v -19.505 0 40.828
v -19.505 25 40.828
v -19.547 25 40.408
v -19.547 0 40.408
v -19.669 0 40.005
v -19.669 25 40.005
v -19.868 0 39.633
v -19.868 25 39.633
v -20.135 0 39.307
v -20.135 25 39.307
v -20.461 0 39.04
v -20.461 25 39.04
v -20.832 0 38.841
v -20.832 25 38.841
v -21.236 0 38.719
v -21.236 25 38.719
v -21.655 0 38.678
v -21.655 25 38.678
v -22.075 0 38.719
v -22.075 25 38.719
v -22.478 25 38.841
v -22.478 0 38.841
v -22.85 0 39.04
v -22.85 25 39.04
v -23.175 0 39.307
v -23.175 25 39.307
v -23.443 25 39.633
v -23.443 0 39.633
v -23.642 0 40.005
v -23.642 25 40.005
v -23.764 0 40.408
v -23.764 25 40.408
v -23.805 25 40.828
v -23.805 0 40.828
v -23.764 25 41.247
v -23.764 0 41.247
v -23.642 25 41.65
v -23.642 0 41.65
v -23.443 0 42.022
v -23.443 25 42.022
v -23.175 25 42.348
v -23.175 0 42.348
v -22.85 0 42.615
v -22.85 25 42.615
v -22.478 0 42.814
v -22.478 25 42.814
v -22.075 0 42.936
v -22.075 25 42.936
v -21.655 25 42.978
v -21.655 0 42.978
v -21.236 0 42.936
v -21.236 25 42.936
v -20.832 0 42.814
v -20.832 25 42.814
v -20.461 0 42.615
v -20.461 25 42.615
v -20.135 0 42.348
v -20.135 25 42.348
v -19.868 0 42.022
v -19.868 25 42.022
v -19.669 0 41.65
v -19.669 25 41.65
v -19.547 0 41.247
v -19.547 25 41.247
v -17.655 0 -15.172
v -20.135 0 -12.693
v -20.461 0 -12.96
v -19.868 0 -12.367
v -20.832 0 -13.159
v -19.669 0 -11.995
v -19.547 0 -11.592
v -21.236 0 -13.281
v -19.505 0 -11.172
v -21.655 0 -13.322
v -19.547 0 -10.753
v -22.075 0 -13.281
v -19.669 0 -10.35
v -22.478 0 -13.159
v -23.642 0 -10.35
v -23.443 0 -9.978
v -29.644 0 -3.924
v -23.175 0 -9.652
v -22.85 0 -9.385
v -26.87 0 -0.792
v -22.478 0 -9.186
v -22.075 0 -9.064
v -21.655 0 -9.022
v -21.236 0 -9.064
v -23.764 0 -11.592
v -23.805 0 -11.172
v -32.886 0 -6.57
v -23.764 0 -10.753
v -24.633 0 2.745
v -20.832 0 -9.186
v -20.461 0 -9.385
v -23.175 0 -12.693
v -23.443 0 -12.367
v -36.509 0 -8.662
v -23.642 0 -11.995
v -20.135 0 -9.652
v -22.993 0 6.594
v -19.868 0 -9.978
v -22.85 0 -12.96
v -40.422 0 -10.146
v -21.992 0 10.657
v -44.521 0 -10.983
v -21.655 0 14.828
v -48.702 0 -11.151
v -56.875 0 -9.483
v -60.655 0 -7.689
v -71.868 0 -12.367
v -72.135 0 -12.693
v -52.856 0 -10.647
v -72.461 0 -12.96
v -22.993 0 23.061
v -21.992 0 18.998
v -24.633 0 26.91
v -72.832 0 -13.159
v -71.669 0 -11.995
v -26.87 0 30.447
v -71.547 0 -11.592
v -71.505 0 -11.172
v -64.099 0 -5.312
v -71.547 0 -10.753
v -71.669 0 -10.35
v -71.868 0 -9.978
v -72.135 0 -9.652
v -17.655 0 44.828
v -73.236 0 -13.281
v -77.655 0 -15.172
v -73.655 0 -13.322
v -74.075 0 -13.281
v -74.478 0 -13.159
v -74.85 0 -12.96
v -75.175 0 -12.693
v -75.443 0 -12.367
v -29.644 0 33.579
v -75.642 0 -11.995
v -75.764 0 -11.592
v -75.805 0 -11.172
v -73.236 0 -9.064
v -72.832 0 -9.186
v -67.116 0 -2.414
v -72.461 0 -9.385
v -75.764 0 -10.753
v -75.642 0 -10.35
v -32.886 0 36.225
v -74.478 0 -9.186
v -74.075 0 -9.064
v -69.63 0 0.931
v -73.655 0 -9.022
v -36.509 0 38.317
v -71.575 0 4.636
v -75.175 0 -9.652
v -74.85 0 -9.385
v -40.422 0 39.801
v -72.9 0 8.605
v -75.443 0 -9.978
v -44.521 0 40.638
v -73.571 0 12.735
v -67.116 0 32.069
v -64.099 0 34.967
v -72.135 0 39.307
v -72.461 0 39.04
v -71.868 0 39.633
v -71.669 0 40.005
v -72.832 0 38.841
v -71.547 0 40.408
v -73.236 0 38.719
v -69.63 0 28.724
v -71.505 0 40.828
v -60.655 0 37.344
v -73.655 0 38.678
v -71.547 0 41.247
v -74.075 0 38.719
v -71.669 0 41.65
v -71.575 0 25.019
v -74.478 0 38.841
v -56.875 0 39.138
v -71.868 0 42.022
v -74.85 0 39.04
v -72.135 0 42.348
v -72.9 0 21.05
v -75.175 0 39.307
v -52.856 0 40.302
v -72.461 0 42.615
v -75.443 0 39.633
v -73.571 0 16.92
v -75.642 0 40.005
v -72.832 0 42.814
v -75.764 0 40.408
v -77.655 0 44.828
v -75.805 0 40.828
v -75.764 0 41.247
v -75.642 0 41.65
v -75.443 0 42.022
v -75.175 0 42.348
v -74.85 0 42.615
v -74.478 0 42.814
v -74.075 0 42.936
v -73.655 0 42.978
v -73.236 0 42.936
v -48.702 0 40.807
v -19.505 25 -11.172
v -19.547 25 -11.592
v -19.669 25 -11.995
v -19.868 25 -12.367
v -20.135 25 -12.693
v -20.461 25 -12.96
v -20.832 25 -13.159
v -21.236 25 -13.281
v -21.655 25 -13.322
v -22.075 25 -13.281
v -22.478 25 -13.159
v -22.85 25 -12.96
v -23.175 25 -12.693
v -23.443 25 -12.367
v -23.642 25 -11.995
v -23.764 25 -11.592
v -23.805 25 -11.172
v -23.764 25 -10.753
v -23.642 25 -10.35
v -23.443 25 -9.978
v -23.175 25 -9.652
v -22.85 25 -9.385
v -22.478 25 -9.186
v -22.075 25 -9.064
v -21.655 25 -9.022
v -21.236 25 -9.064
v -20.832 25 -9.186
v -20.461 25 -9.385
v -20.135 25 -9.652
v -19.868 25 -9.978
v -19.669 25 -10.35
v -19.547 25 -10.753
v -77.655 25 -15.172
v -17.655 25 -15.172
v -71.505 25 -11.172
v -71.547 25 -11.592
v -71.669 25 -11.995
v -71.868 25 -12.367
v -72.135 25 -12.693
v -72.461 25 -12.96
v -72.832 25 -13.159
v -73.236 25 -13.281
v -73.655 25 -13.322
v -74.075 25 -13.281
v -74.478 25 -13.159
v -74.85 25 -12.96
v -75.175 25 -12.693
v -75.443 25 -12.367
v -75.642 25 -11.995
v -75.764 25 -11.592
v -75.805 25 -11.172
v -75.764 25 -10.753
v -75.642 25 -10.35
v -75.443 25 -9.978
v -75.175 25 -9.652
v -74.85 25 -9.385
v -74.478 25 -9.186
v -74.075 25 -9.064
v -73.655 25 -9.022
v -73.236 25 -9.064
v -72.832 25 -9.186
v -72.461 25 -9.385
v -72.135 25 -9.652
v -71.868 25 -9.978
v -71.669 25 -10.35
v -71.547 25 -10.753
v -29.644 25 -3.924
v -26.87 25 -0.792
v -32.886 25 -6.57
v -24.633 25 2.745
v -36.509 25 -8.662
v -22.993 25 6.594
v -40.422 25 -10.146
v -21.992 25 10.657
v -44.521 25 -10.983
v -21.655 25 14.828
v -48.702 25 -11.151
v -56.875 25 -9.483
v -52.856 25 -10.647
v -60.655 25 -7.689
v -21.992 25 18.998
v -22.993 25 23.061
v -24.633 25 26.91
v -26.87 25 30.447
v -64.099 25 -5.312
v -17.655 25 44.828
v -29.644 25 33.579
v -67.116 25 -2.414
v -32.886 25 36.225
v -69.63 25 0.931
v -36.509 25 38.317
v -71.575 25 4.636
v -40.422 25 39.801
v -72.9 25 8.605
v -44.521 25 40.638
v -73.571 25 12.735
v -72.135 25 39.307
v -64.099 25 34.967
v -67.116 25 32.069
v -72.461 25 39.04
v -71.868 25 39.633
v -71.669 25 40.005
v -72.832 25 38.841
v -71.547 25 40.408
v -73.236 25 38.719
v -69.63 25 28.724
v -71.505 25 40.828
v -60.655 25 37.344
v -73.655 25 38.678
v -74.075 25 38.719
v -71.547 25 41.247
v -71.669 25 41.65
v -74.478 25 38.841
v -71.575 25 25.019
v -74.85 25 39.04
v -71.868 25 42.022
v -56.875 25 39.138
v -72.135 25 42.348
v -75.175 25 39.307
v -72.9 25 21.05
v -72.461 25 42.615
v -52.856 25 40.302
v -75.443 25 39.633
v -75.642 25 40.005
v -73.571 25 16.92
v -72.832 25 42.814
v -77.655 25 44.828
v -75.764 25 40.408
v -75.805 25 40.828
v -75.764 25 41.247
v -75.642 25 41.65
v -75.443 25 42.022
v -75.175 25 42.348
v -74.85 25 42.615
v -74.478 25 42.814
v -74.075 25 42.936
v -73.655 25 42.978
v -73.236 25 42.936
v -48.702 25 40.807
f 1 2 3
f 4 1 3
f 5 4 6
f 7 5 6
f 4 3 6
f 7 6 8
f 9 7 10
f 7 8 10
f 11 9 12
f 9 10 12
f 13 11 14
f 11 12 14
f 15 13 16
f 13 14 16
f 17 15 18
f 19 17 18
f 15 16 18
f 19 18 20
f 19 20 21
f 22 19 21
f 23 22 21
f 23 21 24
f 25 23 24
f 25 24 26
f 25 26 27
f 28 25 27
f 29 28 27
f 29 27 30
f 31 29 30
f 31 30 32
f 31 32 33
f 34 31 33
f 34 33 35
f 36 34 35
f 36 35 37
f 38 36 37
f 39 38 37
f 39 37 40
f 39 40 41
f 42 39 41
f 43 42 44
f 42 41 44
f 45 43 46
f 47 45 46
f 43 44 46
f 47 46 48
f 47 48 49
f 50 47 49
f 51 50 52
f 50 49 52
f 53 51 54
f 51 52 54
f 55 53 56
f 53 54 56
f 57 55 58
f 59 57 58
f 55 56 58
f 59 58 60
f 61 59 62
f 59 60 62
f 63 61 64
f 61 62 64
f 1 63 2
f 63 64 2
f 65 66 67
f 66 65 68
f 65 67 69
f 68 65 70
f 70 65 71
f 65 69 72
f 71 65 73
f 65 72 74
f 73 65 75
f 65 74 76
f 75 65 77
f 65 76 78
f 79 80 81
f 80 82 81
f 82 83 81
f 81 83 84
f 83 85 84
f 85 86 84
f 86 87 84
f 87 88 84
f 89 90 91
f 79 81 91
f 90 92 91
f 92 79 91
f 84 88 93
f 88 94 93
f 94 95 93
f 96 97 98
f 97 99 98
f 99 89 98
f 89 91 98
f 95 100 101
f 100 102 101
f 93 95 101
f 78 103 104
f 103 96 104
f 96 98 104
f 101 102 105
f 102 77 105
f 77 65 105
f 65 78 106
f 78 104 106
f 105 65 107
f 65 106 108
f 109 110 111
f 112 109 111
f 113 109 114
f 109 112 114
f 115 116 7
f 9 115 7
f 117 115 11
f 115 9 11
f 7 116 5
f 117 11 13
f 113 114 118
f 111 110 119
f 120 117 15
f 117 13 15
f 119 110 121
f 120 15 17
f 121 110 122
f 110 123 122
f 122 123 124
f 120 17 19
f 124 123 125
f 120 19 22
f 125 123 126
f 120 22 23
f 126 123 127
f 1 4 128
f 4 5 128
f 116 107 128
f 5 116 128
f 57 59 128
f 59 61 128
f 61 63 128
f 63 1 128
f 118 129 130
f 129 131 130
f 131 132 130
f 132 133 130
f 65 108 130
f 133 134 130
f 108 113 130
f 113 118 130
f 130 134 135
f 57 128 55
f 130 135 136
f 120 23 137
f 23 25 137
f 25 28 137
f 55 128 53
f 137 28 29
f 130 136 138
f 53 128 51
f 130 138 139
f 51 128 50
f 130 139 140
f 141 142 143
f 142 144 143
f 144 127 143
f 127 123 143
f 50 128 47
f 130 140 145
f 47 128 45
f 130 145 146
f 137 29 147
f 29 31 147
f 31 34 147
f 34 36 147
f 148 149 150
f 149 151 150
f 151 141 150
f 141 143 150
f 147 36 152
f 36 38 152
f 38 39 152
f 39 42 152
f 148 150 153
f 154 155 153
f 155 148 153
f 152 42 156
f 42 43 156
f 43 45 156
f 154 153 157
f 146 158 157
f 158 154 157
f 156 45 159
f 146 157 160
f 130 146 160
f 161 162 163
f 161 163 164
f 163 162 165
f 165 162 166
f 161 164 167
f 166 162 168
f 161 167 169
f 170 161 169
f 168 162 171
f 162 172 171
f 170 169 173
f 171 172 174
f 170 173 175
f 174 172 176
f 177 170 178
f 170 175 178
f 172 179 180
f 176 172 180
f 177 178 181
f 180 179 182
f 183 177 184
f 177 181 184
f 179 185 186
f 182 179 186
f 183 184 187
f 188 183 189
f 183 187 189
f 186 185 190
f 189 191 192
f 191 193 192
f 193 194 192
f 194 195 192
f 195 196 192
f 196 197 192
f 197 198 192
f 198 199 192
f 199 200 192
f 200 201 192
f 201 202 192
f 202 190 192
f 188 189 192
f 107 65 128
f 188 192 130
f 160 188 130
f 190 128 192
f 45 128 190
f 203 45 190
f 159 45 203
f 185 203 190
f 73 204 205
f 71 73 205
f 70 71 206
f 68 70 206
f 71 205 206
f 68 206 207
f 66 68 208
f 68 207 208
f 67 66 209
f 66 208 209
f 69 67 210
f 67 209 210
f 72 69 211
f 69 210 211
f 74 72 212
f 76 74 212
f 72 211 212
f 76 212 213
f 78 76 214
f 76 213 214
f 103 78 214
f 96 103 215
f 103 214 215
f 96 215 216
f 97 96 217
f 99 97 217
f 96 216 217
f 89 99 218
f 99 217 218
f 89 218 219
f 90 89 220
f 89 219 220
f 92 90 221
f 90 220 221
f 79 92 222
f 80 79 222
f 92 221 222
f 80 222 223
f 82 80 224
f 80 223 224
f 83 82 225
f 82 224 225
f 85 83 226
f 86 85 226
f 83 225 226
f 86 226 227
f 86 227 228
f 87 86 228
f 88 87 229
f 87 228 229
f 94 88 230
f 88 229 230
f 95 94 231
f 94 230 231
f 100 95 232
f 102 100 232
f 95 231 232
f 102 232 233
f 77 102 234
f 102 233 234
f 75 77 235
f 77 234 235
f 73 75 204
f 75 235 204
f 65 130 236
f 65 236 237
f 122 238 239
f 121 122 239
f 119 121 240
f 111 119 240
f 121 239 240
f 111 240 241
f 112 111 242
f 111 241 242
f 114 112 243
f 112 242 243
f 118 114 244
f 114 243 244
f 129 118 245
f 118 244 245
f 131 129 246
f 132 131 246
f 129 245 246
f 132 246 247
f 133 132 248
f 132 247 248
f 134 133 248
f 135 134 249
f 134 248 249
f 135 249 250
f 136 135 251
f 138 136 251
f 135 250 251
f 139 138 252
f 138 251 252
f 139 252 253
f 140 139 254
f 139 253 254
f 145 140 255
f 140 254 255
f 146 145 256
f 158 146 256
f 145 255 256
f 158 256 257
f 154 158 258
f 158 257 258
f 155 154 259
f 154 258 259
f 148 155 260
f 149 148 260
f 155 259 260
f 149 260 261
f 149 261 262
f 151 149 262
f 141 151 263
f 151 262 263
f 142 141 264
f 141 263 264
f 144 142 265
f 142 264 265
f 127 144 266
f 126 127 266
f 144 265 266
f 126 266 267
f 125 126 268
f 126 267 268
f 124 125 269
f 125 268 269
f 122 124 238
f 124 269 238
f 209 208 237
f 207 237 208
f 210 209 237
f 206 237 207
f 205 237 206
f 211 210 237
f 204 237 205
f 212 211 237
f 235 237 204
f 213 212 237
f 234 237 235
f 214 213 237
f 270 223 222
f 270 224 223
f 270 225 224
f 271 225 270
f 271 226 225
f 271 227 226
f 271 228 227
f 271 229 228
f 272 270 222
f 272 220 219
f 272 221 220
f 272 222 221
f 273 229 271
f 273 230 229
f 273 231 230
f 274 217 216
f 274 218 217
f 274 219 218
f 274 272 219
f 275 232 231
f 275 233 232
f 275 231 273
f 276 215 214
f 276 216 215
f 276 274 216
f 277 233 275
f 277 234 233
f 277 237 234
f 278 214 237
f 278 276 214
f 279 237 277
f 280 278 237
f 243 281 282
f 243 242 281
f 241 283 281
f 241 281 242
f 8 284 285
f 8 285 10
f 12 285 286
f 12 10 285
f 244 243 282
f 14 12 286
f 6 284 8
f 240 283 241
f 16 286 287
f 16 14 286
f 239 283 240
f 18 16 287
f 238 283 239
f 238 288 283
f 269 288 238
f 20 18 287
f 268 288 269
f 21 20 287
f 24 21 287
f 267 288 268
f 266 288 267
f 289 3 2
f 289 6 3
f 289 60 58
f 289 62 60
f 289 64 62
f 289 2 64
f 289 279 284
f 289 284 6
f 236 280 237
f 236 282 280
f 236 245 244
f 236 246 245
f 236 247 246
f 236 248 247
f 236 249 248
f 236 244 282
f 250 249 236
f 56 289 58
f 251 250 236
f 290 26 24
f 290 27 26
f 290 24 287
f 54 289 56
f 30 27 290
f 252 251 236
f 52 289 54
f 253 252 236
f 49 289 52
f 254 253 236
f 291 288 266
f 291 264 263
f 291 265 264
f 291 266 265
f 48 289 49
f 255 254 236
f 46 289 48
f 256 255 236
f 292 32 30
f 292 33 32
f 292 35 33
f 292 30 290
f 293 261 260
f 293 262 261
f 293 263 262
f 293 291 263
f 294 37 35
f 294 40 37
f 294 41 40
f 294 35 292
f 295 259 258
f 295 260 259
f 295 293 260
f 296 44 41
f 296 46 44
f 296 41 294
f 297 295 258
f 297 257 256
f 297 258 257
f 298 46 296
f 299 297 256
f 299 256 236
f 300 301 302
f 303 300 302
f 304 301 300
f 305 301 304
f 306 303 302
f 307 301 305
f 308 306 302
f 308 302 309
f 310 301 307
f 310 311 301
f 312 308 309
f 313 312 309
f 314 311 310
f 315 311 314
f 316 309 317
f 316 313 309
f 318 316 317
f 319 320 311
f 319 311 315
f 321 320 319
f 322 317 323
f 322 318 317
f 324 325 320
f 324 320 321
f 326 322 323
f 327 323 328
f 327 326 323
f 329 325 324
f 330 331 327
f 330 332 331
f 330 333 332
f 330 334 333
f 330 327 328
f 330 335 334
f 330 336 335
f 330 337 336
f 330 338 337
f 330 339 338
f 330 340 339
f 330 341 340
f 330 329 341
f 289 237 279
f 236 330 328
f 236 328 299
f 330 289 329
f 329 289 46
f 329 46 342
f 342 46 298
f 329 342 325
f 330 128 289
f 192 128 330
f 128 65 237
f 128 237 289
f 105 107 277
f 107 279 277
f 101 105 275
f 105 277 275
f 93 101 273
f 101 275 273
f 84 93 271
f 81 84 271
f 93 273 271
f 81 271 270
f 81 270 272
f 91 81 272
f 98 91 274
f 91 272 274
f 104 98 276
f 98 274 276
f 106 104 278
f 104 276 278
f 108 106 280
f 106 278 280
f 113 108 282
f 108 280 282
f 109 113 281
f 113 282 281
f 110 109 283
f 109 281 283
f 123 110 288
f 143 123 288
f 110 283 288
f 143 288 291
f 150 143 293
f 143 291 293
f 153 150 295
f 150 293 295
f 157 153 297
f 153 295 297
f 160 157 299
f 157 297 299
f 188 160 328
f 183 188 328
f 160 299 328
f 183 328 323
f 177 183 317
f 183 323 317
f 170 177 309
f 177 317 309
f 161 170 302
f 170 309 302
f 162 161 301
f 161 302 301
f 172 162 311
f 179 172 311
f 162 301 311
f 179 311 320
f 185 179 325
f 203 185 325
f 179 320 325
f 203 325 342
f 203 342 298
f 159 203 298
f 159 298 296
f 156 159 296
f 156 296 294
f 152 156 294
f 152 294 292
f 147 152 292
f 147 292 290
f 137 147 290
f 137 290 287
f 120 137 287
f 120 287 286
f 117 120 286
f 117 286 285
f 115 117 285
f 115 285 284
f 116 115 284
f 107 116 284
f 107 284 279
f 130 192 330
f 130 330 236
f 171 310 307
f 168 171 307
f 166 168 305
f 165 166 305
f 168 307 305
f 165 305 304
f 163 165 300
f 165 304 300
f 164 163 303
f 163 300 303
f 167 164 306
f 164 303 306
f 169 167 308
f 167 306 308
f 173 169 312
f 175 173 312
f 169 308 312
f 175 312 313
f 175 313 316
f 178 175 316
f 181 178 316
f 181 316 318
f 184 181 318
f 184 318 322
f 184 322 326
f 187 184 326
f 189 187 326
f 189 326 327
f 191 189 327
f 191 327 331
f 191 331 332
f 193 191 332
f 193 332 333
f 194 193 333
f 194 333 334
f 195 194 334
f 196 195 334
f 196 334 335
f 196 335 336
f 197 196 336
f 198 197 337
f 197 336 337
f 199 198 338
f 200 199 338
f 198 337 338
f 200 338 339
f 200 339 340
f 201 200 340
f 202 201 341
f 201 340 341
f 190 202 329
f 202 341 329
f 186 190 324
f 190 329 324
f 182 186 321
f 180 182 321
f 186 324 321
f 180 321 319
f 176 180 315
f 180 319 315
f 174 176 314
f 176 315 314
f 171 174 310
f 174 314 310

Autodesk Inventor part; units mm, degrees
ref_plane "YZ Plane" through (0, 0, 0) normal (1, 0, 0) x (0, 1, 0)
ref_plane "XZ Plane" through (0, 0, 0) normal (0, 1, 0) x (-1, 0, 0)
ref_plane "XY Plane" through (0, 0, 0) normal (0, 0, 1) x (1, 0, 0)
sketch "Sketch1" plane through (0, 0, 0) normal (0, 1, 0) x (-1, 0, 0)
  line L0 (17.6552, 44.8276) -> (77.6552, 44.8276)
  line L1 (77.6552, 44.8276) -> (77.6552, -15.1724)
  line L2 (77.6552, -15.1724) -> (17.6552, -15.1724)
  line L3 (17.6552, -15.1724) -> (17.6552, 44.8276)
  point P0 (0, 0)
  dimension "d0" = 60
  dimension "d1" = 60
extrude "Extrusion1" add sketch "Sketch1" along normal blind 25
sketch "Sketch2" plane through (0, 25, 0) normal (0, 1, 0) x (1, 0, 0)
  line L0 (-17.6552, -44.8276) -> (-17.6552, 15.1724) projected
  line L1 (-17.6552, 15.1724) -> (-77.6552, 15.1724) projected
  line L2 (-77.6552, 15.1724) -> (-77.6552, -44.8276) projected
  circle A0 centre (-47.6552, -14.8276) radius 26
  circle A1 centre (-73.6552, 11.1724) radius 2.15
  circle A2 centre (-21.6552, 11.1724) radius 2.15
  circle A3 centre (-21.6552, -40.8276) radius 2.15
  circle A4 centre (-73.6552, -40.8276) radius 2.15
  point P0 (0, 0)
  dimension "d4" = 52
  dimension "d5" = 30
  dimension "d6" = 30
  dimension "d7" = 4.3
  dimension "d8" = 4.3
  dimension "d9" = 4.3
  dimension "d10" = 4.3
  dimension "d11" = 52
  dimension "d12" = 52
  dimension "d13" = 52
  dimension "d14" = 52
  dimension "d15" = 4
  dimension "d16" = 4
  dimension "d17" = 4
  dimension "d18" = 4
extrude "Extrusion2" cut sketch "Sketch2" against normal blind 38
properties part number "Fan60"
